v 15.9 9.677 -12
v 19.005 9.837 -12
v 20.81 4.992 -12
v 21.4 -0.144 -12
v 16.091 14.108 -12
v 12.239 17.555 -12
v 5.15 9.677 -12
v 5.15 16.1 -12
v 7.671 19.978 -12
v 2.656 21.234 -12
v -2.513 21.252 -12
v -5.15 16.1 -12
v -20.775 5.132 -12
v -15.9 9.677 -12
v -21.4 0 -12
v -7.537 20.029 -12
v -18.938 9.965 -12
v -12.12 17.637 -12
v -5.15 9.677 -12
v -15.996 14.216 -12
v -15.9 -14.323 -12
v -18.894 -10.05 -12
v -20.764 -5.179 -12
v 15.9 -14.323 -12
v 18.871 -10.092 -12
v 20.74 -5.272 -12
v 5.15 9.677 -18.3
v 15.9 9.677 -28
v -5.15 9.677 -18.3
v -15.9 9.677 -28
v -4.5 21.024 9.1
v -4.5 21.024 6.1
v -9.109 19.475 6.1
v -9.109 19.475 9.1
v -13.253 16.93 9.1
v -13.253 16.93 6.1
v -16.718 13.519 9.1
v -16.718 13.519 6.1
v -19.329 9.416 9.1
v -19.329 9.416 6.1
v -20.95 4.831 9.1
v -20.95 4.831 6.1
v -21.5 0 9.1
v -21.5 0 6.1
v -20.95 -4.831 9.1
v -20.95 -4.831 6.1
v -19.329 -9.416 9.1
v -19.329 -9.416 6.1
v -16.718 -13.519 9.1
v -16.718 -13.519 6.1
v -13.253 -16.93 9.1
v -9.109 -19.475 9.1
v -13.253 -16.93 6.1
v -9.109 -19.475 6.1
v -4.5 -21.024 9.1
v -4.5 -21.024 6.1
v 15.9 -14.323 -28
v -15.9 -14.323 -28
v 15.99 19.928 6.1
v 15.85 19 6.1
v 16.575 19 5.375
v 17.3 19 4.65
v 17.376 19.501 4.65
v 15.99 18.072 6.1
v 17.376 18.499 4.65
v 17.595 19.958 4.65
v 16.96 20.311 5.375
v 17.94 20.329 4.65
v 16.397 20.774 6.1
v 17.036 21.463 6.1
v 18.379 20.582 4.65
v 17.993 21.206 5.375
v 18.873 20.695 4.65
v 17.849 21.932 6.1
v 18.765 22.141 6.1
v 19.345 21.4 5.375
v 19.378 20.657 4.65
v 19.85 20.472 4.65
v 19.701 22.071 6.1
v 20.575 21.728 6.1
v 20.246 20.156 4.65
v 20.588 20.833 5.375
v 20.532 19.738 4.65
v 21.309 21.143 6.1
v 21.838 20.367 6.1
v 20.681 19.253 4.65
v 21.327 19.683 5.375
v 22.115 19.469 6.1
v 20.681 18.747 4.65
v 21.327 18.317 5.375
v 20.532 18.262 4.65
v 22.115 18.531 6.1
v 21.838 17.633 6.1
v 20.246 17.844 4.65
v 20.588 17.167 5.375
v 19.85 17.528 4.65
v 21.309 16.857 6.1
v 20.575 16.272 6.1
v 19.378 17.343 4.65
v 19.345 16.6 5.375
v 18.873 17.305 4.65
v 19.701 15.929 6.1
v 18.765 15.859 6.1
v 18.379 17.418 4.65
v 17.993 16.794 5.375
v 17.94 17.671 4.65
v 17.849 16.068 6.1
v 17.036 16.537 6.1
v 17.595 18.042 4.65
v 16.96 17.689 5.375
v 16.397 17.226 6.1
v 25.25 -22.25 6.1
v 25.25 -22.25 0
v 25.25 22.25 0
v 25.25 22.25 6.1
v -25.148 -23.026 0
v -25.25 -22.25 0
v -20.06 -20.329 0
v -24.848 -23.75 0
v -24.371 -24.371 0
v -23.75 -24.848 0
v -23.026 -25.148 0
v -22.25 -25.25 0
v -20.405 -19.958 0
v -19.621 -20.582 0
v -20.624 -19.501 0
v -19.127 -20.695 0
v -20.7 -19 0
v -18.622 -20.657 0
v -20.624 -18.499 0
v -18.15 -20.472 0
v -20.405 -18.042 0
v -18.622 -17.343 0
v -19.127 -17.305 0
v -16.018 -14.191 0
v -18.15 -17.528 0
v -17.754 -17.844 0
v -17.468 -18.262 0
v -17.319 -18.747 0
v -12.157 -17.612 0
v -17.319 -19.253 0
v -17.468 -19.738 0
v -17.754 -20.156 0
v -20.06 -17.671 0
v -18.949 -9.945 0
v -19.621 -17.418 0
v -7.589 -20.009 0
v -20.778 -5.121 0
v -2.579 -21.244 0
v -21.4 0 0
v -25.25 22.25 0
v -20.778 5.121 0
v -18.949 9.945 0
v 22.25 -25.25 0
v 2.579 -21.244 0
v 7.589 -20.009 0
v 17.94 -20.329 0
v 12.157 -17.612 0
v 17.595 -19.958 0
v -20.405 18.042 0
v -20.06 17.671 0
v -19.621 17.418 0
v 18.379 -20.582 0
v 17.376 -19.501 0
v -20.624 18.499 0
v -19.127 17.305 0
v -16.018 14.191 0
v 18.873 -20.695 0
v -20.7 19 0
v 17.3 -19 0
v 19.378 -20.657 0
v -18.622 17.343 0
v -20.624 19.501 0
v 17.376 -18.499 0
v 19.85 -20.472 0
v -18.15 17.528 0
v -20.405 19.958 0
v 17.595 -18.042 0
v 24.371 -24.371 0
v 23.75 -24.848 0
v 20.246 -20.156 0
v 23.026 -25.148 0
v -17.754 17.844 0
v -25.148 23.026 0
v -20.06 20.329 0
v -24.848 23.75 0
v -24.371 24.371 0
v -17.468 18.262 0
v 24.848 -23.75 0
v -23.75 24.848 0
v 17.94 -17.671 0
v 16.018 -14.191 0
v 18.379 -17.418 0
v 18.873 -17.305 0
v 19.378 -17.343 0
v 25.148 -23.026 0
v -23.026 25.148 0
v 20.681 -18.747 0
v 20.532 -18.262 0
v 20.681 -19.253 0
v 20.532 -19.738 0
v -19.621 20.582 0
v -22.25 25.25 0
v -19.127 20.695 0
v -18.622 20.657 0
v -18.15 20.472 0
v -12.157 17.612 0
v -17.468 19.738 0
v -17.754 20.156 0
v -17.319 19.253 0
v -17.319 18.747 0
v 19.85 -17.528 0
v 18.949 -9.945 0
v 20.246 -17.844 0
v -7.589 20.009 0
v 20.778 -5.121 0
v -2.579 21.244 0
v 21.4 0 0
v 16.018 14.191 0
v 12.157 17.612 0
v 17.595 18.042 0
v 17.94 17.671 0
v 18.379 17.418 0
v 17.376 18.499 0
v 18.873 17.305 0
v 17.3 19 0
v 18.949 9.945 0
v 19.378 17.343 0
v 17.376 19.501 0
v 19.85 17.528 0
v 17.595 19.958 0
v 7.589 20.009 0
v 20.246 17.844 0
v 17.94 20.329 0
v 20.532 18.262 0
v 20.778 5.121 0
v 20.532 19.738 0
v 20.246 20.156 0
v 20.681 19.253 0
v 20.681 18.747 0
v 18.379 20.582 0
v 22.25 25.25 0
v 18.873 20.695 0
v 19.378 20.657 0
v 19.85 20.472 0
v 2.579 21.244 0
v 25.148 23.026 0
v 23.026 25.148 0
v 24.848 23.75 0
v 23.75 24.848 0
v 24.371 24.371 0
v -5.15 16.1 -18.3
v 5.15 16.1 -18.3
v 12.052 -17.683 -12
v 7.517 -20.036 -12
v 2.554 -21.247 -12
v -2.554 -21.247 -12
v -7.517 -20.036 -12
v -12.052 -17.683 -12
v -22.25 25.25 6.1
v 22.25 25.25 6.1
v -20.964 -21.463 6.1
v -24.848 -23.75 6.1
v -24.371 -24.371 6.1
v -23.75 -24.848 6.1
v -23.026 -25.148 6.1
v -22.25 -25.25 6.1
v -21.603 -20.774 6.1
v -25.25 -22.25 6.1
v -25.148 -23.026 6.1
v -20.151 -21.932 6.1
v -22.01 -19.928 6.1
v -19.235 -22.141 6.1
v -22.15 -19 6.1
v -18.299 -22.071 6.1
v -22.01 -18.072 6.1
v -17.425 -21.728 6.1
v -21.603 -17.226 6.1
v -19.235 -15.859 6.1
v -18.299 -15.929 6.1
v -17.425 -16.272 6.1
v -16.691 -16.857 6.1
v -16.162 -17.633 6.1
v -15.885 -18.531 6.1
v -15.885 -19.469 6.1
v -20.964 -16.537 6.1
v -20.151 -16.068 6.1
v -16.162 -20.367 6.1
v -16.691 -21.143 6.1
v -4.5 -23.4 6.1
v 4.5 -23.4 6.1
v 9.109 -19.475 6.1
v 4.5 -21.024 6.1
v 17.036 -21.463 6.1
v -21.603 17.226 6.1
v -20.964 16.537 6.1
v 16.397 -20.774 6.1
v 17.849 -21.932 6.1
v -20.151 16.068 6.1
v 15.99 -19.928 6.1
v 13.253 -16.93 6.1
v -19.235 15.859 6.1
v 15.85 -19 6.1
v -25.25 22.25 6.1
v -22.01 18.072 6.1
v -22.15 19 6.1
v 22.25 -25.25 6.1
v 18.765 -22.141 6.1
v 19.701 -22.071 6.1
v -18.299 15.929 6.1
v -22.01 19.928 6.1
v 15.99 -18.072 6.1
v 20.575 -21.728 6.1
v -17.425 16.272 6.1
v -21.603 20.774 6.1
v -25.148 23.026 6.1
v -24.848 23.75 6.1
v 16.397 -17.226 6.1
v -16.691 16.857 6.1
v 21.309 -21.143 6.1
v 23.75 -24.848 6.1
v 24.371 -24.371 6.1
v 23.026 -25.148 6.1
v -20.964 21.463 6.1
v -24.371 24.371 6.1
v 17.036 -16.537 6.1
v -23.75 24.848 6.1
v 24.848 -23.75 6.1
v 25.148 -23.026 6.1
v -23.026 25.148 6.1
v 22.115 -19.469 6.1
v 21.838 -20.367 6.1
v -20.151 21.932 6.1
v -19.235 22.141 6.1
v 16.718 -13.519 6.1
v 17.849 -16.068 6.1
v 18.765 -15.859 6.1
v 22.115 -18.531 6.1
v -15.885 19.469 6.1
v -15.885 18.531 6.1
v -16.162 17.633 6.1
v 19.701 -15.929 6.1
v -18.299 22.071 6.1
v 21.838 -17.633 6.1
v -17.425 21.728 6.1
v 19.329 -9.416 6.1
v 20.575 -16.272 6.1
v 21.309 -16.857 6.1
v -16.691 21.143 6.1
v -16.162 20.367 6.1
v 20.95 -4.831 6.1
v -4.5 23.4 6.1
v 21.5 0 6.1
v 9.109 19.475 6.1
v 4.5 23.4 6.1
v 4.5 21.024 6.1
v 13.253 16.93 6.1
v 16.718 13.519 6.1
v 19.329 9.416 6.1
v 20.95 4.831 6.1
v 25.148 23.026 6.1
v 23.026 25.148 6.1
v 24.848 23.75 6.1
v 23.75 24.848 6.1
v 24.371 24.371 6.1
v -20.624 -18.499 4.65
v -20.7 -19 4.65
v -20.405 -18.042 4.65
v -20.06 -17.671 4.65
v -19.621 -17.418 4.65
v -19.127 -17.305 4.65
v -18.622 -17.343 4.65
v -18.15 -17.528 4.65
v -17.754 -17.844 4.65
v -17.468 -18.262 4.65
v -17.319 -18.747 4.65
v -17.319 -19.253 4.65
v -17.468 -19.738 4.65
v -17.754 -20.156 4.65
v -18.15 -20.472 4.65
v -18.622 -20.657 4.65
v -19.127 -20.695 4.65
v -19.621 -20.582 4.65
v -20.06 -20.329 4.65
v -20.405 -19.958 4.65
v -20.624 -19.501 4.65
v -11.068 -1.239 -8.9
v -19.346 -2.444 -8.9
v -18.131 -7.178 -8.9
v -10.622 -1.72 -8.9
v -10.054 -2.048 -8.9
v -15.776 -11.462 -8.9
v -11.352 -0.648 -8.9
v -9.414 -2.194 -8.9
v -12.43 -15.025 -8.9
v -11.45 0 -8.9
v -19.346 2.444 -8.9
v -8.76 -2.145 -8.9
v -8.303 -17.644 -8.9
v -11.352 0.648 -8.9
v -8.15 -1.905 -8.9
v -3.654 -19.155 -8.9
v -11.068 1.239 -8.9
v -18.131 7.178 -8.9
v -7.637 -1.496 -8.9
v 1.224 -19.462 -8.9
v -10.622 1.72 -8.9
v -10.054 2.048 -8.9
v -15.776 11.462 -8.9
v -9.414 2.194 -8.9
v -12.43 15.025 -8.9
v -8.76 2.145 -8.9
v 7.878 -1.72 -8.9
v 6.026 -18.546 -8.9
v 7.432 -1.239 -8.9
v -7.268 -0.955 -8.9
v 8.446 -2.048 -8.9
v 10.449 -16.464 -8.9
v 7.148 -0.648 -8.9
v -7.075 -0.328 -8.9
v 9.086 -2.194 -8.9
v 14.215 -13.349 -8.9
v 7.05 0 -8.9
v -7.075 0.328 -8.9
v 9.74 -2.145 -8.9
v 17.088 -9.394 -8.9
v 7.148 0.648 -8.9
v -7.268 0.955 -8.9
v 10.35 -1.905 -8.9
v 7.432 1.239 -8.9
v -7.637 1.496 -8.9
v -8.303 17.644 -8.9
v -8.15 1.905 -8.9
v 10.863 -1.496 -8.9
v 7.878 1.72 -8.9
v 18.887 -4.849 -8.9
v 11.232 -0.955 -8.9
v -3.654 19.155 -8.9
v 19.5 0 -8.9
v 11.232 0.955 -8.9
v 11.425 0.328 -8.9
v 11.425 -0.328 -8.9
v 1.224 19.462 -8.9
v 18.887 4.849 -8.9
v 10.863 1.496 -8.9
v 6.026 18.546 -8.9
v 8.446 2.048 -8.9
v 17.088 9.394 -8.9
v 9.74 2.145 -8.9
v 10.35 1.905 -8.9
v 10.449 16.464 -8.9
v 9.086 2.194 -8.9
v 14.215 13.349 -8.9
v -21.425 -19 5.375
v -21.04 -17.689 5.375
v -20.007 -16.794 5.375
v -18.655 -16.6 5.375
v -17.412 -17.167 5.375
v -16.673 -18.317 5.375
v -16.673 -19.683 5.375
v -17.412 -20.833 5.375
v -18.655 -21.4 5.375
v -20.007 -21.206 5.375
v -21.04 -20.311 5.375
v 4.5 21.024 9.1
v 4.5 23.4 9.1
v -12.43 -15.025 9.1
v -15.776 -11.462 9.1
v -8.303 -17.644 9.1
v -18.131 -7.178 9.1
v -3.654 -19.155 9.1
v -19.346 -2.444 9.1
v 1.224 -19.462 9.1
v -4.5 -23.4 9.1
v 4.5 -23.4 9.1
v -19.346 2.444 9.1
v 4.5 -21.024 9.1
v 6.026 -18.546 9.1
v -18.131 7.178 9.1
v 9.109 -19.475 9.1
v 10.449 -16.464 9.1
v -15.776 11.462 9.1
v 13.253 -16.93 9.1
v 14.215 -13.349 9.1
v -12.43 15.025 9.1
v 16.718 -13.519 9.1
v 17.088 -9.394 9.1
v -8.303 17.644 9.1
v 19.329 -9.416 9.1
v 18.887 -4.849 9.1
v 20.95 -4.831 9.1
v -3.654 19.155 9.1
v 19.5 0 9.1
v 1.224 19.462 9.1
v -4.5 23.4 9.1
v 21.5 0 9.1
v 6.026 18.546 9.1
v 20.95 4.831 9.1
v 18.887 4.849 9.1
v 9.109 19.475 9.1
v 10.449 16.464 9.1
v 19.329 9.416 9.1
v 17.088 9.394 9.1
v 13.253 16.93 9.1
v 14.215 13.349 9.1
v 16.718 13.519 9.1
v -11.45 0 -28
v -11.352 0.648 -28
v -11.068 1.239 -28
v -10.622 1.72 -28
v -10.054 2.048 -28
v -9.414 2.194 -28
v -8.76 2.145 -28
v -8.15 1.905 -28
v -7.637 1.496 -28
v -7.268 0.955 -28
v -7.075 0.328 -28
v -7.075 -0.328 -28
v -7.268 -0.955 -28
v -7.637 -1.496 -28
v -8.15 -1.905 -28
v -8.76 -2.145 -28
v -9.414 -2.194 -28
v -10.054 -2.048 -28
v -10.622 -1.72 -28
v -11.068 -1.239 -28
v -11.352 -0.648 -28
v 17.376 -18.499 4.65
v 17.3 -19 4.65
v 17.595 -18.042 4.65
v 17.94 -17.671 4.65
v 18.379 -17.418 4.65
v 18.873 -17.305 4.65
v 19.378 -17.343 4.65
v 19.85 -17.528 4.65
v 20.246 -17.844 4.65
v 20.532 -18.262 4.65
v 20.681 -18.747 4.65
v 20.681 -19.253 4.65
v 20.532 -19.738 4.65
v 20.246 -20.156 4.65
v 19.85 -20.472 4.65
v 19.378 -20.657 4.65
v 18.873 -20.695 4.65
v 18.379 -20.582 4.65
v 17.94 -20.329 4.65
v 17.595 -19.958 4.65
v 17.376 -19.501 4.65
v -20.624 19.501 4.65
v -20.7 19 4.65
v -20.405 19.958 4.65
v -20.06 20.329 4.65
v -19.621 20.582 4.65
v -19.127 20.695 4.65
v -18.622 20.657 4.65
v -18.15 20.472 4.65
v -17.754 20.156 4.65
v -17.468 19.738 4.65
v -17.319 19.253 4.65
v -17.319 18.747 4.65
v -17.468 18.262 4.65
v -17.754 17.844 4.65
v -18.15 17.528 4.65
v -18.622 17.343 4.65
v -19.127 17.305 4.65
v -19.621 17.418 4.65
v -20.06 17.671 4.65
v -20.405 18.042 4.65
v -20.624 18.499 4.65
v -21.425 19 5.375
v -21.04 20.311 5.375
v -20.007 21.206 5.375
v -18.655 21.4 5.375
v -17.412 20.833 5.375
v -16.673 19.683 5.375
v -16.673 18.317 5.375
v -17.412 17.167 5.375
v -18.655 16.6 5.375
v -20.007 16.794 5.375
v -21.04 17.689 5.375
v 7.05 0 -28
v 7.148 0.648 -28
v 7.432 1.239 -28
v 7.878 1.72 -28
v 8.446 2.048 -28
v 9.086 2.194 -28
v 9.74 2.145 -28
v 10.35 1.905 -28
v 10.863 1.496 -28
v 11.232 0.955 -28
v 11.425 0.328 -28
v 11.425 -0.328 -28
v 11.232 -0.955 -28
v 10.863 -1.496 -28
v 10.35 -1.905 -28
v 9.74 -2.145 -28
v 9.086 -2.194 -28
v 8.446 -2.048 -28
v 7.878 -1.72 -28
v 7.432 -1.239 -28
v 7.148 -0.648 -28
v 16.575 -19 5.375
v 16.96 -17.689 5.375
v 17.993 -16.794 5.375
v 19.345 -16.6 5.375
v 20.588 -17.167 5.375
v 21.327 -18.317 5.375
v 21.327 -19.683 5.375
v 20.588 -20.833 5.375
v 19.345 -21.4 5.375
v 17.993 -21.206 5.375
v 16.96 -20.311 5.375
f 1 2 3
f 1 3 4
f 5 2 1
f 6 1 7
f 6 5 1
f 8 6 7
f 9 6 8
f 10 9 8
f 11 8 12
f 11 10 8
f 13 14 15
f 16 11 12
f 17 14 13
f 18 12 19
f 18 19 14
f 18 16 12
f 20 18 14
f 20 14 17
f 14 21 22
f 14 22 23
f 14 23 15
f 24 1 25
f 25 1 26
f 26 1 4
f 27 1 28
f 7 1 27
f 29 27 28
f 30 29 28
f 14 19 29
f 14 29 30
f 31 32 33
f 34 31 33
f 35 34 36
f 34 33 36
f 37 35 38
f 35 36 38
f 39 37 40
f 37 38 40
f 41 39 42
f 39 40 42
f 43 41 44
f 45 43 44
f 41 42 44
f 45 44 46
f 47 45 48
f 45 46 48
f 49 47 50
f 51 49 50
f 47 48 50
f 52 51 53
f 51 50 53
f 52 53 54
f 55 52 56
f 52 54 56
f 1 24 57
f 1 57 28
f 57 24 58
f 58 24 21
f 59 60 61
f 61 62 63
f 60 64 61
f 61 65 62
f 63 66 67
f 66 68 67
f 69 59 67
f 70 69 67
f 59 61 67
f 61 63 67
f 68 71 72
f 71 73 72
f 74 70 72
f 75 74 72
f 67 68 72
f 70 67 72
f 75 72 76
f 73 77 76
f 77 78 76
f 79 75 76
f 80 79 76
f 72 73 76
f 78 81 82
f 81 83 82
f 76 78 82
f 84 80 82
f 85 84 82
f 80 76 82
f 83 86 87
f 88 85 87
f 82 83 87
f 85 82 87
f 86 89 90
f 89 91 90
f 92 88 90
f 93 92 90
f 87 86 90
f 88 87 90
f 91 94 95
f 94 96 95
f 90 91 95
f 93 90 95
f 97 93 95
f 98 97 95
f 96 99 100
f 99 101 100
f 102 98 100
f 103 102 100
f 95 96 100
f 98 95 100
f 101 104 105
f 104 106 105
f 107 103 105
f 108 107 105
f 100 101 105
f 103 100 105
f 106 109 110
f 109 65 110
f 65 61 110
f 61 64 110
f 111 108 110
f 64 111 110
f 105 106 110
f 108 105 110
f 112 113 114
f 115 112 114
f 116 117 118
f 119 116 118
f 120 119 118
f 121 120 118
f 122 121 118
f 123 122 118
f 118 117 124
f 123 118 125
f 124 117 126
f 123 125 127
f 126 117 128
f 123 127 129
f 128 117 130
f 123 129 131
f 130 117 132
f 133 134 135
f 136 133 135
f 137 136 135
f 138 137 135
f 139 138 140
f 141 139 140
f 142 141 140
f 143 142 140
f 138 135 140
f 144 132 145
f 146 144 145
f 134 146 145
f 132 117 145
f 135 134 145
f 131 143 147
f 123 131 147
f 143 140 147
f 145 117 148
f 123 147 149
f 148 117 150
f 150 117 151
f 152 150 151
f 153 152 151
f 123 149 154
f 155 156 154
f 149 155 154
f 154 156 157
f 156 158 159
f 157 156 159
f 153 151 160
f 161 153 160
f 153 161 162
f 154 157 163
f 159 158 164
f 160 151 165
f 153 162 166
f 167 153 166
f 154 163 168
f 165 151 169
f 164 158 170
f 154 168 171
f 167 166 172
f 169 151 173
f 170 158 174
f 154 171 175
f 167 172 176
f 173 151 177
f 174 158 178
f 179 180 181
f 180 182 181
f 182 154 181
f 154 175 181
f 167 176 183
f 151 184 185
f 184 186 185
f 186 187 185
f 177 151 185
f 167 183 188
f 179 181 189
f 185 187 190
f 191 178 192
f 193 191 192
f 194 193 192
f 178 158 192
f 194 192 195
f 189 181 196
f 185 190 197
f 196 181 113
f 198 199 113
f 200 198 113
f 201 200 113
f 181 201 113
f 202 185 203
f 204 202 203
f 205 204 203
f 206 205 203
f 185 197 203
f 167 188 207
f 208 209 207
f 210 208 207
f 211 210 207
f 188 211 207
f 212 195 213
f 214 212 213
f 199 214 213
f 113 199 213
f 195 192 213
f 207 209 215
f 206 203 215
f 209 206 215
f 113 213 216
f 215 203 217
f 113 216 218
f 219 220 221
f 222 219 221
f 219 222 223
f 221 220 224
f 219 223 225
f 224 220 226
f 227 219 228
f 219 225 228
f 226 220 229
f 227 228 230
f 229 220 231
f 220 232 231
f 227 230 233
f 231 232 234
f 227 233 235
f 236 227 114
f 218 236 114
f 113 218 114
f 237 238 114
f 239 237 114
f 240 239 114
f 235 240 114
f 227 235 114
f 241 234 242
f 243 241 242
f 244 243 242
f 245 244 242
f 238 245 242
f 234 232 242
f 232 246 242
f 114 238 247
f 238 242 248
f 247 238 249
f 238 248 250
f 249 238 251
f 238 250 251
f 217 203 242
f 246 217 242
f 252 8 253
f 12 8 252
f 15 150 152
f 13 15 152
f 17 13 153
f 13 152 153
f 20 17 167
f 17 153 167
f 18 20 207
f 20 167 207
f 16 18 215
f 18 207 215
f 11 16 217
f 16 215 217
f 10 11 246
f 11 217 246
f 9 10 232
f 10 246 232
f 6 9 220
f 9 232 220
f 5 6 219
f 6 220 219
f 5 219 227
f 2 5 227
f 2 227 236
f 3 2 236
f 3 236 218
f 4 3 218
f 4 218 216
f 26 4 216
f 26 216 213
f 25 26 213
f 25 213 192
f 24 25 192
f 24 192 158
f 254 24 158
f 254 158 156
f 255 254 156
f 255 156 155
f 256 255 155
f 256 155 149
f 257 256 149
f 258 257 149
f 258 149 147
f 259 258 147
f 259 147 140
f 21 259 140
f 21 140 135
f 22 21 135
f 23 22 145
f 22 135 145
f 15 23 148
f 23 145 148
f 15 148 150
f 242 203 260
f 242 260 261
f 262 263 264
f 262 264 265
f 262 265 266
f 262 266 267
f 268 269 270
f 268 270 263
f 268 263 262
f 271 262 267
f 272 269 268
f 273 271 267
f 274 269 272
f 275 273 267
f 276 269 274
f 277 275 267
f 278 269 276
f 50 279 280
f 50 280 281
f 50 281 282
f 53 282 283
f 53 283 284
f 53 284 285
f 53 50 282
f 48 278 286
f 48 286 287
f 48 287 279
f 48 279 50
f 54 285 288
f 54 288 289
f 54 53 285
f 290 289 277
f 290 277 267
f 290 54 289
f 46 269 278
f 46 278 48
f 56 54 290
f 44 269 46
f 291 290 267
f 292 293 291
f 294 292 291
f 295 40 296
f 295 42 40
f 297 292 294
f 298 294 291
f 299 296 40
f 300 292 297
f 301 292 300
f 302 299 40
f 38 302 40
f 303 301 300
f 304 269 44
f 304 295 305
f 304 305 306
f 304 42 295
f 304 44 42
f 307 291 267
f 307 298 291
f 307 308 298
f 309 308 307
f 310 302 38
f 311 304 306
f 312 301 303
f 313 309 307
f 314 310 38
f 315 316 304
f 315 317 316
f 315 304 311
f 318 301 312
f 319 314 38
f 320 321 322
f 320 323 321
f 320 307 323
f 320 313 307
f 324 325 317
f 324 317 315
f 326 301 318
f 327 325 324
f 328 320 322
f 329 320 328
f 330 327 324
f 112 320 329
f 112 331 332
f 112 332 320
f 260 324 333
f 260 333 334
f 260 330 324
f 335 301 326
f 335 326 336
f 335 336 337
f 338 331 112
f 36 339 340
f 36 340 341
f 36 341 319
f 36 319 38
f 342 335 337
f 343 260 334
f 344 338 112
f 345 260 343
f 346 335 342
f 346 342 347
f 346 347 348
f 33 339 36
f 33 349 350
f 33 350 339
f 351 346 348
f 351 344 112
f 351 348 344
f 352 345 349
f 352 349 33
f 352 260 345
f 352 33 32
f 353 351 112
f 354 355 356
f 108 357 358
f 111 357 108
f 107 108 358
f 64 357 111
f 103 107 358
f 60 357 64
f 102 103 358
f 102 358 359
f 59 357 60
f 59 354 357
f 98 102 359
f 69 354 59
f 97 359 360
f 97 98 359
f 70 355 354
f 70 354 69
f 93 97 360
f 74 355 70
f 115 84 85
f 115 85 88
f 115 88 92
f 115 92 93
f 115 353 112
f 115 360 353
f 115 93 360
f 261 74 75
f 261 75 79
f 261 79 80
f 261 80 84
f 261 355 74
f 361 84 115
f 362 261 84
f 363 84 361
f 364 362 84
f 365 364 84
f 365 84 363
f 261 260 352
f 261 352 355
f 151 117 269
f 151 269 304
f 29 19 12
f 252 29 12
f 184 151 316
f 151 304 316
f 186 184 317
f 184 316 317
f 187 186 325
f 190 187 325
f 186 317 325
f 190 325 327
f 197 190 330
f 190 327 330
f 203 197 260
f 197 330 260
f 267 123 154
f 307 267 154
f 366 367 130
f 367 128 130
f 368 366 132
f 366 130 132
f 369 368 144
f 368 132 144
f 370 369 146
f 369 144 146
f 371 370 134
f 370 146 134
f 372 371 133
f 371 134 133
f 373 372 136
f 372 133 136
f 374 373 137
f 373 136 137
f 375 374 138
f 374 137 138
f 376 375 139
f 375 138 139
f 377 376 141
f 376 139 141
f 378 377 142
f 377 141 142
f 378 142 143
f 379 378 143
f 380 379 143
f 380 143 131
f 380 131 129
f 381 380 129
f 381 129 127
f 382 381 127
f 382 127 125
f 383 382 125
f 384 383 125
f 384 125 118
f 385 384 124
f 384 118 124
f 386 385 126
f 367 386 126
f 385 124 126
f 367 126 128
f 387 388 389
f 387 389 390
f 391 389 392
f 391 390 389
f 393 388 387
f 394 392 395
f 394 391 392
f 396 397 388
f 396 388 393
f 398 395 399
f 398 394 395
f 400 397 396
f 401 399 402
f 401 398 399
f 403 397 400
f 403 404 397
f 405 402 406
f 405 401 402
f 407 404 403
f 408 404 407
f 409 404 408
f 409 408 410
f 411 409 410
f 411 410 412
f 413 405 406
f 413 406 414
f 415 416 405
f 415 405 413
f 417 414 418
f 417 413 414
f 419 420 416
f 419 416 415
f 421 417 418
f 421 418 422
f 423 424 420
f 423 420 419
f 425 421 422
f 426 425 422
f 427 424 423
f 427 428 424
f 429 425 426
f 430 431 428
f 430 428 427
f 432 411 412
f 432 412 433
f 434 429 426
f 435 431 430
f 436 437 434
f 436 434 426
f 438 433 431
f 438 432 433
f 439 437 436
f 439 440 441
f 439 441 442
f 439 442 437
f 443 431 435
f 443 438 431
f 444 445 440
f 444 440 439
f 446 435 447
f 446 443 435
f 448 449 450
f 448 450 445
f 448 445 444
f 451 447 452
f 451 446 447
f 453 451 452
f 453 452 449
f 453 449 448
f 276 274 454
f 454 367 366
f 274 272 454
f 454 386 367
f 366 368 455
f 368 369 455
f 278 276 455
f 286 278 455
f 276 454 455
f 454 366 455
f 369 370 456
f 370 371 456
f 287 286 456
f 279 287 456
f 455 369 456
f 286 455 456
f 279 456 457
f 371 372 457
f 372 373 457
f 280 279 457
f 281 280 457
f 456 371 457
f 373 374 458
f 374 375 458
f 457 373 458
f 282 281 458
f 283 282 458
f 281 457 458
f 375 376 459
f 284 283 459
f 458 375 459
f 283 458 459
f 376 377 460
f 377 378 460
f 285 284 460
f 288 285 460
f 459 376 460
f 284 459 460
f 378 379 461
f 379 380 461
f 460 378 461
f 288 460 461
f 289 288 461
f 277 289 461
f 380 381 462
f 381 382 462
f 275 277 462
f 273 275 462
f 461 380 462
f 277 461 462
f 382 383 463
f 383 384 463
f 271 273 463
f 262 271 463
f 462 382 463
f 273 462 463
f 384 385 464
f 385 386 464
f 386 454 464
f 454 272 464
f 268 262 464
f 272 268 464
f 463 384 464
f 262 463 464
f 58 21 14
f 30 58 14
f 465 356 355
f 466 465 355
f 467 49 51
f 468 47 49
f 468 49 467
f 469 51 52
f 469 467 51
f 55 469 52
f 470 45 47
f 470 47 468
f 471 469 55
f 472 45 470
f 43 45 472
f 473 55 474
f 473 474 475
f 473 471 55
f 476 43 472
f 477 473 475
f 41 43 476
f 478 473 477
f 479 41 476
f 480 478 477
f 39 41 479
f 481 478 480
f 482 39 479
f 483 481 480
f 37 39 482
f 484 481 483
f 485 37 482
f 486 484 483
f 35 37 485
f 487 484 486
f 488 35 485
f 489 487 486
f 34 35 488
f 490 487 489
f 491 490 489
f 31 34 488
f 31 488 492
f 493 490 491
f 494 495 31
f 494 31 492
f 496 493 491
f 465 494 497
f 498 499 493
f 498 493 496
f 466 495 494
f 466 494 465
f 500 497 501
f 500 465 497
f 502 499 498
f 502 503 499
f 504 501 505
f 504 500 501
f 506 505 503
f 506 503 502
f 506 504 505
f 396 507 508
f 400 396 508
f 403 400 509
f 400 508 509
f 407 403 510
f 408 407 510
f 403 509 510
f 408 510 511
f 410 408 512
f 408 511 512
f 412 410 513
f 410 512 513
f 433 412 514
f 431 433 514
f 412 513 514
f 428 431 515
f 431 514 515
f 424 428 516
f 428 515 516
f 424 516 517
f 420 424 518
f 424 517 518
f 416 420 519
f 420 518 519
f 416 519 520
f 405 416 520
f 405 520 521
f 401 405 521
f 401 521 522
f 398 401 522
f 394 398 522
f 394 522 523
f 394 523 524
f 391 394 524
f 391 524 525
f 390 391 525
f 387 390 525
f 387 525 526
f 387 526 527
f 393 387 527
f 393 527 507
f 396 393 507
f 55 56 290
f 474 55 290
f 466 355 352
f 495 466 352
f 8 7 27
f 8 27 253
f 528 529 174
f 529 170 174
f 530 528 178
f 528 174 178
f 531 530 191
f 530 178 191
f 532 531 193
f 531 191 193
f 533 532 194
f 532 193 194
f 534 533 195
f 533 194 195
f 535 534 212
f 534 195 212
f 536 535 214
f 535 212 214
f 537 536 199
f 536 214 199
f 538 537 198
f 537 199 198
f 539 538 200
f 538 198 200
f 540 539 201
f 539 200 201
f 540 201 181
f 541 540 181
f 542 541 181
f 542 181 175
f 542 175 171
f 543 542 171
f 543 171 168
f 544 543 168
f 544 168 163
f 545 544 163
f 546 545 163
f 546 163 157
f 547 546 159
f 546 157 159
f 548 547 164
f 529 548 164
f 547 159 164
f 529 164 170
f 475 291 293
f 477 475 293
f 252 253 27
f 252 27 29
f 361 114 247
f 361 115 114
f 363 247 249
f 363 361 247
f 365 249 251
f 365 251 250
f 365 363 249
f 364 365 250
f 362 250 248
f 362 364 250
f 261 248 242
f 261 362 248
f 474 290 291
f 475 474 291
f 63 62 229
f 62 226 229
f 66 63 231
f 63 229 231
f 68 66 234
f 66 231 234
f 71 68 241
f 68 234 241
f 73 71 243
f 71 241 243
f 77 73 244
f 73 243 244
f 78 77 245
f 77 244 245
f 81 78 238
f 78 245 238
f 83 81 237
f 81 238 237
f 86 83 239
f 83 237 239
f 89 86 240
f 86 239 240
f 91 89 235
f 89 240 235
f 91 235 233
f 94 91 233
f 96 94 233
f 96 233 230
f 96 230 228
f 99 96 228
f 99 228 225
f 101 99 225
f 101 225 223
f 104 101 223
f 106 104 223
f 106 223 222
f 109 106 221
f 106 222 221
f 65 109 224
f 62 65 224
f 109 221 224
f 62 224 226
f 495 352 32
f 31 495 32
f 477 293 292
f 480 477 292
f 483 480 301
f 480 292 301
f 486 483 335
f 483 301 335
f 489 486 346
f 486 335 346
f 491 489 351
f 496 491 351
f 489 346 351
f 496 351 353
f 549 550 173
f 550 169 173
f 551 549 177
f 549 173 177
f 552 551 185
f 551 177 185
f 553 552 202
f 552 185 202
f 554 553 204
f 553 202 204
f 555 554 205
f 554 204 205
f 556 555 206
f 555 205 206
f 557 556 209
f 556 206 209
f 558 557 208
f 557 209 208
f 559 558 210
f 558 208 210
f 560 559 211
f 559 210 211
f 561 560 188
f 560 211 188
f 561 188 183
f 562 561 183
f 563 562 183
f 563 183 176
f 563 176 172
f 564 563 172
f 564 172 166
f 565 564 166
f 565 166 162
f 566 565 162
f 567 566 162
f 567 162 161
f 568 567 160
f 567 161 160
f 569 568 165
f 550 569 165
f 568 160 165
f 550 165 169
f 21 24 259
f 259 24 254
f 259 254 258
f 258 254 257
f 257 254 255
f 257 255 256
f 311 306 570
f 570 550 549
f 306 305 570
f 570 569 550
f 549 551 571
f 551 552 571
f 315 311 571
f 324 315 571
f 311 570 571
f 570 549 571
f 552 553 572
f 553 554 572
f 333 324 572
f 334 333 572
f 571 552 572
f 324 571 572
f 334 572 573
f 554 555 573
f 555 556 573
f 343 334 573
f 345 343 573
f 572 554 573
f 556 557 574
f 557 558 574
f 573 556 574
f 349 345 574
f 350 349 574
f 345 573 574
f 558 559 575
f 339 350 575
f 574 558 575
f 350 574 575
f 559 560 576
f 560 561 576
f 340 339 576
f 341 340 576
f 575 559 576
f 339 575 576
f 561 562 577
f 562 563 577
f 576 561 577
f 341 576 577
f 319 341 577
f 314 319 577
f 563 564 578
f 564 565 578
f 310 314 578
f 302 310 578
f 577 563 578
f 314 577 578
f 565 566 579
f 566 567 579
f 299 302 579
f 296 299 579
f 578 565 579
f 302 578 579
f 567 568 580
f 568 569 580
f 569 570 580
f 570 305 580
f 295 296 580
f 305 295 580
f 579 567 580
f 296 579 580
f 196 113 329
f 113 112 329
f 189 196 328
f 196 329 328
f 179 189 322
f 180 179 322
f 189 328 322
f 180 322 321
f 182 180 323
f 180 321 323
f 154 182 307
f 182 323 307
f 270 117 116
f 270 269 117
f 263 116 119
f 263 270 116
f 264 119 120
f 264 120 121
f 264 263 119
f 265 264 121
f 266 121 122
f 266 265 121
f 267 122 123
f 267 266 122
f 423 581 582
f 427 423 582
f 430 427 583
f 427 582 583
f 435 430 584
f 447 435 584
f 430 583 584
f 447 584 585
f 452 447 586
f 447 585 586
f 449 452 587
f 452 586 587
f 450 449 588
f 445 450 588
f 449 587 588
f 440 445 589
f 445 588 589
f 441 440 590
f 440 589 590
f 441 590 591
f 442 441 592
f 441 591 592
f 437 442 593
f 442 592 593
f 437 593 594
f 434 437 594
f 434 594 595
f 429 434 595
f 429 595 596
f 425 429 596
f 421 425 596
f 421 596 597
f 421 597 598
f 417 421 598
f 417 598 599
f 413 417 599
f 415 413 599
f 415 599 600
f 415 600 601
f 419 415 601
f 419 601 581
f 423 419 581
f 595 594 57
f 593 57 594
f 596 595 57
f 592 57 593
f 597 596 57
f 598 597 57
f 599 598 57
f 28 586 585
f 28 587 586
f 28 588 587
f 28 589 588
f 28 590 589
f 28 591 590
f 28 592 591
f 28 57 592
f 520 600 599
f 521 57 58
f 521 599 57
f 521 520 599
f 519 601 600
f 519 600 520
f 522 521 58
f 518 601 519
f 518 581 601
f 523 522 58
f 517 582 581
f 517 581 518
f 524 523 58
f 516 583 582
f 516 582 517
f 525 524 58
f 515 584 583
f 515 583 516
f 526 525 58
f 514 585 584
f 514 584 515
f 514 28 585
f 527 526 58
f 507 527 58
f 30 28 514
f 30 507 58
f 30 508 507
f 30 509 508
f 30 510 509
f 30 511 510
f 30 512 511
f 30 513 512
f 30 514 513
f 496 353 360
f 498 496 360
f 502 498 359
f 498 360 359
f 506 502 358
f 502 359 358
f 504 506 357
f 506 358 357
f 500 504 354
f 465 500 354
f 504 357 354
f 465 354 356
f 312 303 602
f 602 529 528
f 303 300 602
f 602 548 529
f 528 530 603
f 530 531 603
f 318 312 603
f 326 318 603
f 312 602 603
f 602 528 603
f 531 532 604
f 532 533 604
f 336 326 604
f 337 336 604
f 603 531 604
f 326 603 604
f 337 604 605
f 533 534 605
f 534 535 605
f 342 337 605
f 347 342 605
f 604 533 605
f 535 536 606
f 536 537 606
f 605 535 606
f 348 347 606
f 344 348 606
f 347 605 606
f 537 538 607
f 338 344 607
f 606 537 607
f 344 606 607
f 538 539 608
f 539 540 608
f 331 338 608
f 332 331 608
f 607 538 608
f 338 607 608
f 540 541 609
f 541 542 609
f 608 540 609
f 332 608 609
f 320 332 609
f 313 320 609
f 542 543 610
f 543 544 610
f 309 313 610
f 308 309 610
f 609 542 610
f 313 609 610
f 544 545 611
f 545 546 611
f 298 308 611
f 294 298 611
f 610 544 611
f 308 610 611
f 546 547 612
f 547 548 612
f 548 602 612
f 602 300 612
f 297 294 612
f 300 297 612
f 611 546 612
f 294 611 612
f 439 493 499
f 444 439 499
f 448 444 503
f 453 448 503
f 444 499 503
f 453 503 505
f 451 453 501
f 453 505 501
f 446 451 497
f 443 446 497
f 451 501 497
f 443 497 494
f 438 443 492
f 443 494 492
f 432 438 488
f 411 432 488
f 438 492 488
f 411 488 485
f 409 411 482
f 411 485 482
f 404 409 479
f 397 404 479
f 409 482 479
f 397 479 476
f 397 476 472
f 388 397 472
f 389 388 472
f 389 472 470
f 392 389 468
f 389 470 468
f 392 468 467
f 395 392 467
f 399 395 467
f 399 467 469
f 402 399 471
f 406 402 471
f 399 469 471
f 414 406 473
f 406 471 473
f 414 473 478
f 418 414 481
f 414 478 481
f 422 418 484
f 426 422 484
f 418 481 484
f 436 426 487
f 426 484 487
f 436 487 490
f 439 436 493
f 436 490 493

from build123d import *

# Parameters (mm, degrees)
SKIZZE1_W                                            = 50.5
SKIZZE1_H                                            = 50.5
AUFSATZ_LINEAR_AUSTRAGEN1_DEPTH                      = 6.1
AUFSATZ_LINEAR_AUSTRAGEN2_DEPTH                      = 3
SKIZZE3_R                                            = 21.4
AUFSATZ_LINEAR_AUSTRAGEN3_DEPTH                      = 12
SKIZZE4_W                                            = 31.8
SKIZZE4_H                                            = 24
AUFSATZ_LINEAR_AUSTRAGEN4_DEPTH                      = 16
FORMSENKUNG_F_R_M3_LINSENSENKSCHRAUBE_MI_D           = 3.4
FORMSENKUNG_F_R_M3_LINSENSENKSCHRAUBE_MI_CSINK_D     = 6.3
FORMSENKUNG_F_R_M3_LINSENSENKSCHRAUBE_MI_CSINK_ANGLE = 90
VERRUNDUNG1_R                                        = 3
SKIZZE7_R                                            = 19.5
SCHNITT_LINEAR_AUSTRAGEN1_DEPTH                      = 18
F_4_4_4_4_DURCHMESSER_BOHRUNG1_D                     = 4.4
SKIZZE10_W                                           = 10.3
SKIZZE10_H                                           = 6.423058333
AUFSATZ_LINEAR_AUSTRAGEN5_DEPTH                      = 6.3


with BuildPart() as part:
    # Skizze1 → Aufsatz-Linear austragen1 (new body)
    with BuildSketch(Plane.XY):
        Rectangle(SKIZZE1_W, SKIZZE1_H)
    extrude(amount=AUFSATZ_LINEAR_AUSTRAGEN1_DEPTH)

    # Skizze2 → Aufsatz-Linear austragen2 (add)
    with BuildSketch(Plane.XY.offset(6.1)):
        with BuildLine():
            Line((-4.5, -21.023796042), (-4.5, 21.023796042))
            ThreePointArc((-4.5, 21.023796042), (-21.5, 0), (-4.5, -21.023796042))
        make_face()
        with BuildLine():
            ThreePointArc((4.5, 21.023796042), (0, 21.5), (-4.5, 21.023796042))
            Line((-4.5, 21.023796042), (-4.5, -21.023796042))
            ThreePointArc((-4.5, -21.023796042), (0, -21.5), (4.5, -21.023796042))
            Line((4.5, -21.023796042), (4.5, 21.023796042))
        make_face()
        with BuildLine():
            ThreePointArc((21.5, 0), (16.718253497, 13.518505835), (4.5, 21.023796042))
            Line((4.5, 21.023796042), (4.5, -21.023796042))
            ThreePointArc((4.5, -21.023796042), (16.718253497, -13.518505835), (21.5, 0))
        make_face()
        with BuildLine():
            Line((4.5, 23.4), (-4.5, 23.4))
            Line((-4.5, 23.4), (-4.5, 21.023796042))
            ThreePointArc((-4.5, 21.023796042), (0, 21.5), (4.5, 21.023796042))
            Line((4.5, 21.023796042), (4.5, 23.4))
        make_face()
        with BuildLine():
            ThreePointArc((4.5, -21.023796042), (0, -21.5), (-4.5, -21.023796042))
            Line((-4.5, -21.023796042), (-4.5, -23.4))
            Line((-4.5, -23.4), (4.5, -23.4))
            Line((4.5, -23.4), (4.5, -21.023796042))
        make_face()
    extrude(amount=AUFSATZ_LINEAR_AUSTRAGEN2_DEPTH)

    # Skizze3 → Aufsatz-Linear austragen3 (add)
    with BuildSketch(Plane(origin=(0, 0, 0), x_dir=(-1, 0, 0), z_dir=(0, 0, -1))):
        Circle(SKIZZE3_R)
    extrude(amount=AUFSATZ_LINEAR_AUSTRAGEN3_DEPTH)

    # Skizze4 → Aufsatz-Linear austragen4 (add)
    with BuildSketch(Plane(origin=(0, 0, -12), x_dir=(-1, 0, 0), z_dir=(0, 0, -1))):
        with Locations((0, -2.323058333)):
            Rectangle(SKIZZE4_W, SKIZZE4_H)
    extrude(amount=AUFSATZ_LINEAR_AUSTRAGEN4_DEPTH)

    # Formsenkung für M3 Linsensenkschraube mit Schlitz1 (through all)
    with Locations(Plane.XY.offset(6.1)):
        with Locations((-19, 19), (19, 19), (19, -19), (-19, -19)):
            CounterSinkHole(FORMSENKUNG_F_R_M3_LINSENSENKSCHRAUBE_MI_D / 2, FORMSENKUNG_F_R_M3_LINSENSENKSCHRAUBE_MI_CSINK_D / 2, counter_sink_angle=FORMSENKUNG_F_R_M3_LINSENSENKSCHRAUBE_MI_CSINK_ANGLE)

    # Verrundung1
    verrundung1_edges = [part.edges().sort_by_distance(p)[0] for p in [
        (25.25, -25.25, 3.05),
        (-25.25, -25.25, 3.05),
        (-25.25, 25.25, 3.05),
        (25.25, 25.25, 3.05),
    ]]
    fillet(verrundung1_edges, radius=VERRUNDUNG1_R)

    # Skizze7 → Schnitt-Linear austragen1 (cut)
    with BuildSketch(Plane.XY.offset(9.1)):
        Circle(SKIZZE7_R)
    extrude(amount=-SCHNITT_LINEAR_AUSTRAGEN1_DEPTH, mode=Mode.SUBTRACT)

    # Ø4.4 (4.4) Durchmesser Bohrung1 (through all)
    with Locations(Plane.XY.offset(-8.9)):
        with Locations((-9.25, 0), (9.25, 0)):
            Hole(F_4_4_4_4_DURCHMESSER_BOHRUNG1_D / 2)

    # Skizze10 → Aufsatz-Linear austragen5 (add)
    with BuildSketch(Plane(origin=(0, 0, -12), x_dir=(-1, 0, 0), z_dir=(0, 0, -1))):
        with Locations((0, 12.888470834)):
            Rectangle(SKIZZE10_W, SKIZZE10_H)
    extrude(amount=AUFSATZ_LINEAR_AUSTRAGEN5_DEPTH)


solid = part.part
